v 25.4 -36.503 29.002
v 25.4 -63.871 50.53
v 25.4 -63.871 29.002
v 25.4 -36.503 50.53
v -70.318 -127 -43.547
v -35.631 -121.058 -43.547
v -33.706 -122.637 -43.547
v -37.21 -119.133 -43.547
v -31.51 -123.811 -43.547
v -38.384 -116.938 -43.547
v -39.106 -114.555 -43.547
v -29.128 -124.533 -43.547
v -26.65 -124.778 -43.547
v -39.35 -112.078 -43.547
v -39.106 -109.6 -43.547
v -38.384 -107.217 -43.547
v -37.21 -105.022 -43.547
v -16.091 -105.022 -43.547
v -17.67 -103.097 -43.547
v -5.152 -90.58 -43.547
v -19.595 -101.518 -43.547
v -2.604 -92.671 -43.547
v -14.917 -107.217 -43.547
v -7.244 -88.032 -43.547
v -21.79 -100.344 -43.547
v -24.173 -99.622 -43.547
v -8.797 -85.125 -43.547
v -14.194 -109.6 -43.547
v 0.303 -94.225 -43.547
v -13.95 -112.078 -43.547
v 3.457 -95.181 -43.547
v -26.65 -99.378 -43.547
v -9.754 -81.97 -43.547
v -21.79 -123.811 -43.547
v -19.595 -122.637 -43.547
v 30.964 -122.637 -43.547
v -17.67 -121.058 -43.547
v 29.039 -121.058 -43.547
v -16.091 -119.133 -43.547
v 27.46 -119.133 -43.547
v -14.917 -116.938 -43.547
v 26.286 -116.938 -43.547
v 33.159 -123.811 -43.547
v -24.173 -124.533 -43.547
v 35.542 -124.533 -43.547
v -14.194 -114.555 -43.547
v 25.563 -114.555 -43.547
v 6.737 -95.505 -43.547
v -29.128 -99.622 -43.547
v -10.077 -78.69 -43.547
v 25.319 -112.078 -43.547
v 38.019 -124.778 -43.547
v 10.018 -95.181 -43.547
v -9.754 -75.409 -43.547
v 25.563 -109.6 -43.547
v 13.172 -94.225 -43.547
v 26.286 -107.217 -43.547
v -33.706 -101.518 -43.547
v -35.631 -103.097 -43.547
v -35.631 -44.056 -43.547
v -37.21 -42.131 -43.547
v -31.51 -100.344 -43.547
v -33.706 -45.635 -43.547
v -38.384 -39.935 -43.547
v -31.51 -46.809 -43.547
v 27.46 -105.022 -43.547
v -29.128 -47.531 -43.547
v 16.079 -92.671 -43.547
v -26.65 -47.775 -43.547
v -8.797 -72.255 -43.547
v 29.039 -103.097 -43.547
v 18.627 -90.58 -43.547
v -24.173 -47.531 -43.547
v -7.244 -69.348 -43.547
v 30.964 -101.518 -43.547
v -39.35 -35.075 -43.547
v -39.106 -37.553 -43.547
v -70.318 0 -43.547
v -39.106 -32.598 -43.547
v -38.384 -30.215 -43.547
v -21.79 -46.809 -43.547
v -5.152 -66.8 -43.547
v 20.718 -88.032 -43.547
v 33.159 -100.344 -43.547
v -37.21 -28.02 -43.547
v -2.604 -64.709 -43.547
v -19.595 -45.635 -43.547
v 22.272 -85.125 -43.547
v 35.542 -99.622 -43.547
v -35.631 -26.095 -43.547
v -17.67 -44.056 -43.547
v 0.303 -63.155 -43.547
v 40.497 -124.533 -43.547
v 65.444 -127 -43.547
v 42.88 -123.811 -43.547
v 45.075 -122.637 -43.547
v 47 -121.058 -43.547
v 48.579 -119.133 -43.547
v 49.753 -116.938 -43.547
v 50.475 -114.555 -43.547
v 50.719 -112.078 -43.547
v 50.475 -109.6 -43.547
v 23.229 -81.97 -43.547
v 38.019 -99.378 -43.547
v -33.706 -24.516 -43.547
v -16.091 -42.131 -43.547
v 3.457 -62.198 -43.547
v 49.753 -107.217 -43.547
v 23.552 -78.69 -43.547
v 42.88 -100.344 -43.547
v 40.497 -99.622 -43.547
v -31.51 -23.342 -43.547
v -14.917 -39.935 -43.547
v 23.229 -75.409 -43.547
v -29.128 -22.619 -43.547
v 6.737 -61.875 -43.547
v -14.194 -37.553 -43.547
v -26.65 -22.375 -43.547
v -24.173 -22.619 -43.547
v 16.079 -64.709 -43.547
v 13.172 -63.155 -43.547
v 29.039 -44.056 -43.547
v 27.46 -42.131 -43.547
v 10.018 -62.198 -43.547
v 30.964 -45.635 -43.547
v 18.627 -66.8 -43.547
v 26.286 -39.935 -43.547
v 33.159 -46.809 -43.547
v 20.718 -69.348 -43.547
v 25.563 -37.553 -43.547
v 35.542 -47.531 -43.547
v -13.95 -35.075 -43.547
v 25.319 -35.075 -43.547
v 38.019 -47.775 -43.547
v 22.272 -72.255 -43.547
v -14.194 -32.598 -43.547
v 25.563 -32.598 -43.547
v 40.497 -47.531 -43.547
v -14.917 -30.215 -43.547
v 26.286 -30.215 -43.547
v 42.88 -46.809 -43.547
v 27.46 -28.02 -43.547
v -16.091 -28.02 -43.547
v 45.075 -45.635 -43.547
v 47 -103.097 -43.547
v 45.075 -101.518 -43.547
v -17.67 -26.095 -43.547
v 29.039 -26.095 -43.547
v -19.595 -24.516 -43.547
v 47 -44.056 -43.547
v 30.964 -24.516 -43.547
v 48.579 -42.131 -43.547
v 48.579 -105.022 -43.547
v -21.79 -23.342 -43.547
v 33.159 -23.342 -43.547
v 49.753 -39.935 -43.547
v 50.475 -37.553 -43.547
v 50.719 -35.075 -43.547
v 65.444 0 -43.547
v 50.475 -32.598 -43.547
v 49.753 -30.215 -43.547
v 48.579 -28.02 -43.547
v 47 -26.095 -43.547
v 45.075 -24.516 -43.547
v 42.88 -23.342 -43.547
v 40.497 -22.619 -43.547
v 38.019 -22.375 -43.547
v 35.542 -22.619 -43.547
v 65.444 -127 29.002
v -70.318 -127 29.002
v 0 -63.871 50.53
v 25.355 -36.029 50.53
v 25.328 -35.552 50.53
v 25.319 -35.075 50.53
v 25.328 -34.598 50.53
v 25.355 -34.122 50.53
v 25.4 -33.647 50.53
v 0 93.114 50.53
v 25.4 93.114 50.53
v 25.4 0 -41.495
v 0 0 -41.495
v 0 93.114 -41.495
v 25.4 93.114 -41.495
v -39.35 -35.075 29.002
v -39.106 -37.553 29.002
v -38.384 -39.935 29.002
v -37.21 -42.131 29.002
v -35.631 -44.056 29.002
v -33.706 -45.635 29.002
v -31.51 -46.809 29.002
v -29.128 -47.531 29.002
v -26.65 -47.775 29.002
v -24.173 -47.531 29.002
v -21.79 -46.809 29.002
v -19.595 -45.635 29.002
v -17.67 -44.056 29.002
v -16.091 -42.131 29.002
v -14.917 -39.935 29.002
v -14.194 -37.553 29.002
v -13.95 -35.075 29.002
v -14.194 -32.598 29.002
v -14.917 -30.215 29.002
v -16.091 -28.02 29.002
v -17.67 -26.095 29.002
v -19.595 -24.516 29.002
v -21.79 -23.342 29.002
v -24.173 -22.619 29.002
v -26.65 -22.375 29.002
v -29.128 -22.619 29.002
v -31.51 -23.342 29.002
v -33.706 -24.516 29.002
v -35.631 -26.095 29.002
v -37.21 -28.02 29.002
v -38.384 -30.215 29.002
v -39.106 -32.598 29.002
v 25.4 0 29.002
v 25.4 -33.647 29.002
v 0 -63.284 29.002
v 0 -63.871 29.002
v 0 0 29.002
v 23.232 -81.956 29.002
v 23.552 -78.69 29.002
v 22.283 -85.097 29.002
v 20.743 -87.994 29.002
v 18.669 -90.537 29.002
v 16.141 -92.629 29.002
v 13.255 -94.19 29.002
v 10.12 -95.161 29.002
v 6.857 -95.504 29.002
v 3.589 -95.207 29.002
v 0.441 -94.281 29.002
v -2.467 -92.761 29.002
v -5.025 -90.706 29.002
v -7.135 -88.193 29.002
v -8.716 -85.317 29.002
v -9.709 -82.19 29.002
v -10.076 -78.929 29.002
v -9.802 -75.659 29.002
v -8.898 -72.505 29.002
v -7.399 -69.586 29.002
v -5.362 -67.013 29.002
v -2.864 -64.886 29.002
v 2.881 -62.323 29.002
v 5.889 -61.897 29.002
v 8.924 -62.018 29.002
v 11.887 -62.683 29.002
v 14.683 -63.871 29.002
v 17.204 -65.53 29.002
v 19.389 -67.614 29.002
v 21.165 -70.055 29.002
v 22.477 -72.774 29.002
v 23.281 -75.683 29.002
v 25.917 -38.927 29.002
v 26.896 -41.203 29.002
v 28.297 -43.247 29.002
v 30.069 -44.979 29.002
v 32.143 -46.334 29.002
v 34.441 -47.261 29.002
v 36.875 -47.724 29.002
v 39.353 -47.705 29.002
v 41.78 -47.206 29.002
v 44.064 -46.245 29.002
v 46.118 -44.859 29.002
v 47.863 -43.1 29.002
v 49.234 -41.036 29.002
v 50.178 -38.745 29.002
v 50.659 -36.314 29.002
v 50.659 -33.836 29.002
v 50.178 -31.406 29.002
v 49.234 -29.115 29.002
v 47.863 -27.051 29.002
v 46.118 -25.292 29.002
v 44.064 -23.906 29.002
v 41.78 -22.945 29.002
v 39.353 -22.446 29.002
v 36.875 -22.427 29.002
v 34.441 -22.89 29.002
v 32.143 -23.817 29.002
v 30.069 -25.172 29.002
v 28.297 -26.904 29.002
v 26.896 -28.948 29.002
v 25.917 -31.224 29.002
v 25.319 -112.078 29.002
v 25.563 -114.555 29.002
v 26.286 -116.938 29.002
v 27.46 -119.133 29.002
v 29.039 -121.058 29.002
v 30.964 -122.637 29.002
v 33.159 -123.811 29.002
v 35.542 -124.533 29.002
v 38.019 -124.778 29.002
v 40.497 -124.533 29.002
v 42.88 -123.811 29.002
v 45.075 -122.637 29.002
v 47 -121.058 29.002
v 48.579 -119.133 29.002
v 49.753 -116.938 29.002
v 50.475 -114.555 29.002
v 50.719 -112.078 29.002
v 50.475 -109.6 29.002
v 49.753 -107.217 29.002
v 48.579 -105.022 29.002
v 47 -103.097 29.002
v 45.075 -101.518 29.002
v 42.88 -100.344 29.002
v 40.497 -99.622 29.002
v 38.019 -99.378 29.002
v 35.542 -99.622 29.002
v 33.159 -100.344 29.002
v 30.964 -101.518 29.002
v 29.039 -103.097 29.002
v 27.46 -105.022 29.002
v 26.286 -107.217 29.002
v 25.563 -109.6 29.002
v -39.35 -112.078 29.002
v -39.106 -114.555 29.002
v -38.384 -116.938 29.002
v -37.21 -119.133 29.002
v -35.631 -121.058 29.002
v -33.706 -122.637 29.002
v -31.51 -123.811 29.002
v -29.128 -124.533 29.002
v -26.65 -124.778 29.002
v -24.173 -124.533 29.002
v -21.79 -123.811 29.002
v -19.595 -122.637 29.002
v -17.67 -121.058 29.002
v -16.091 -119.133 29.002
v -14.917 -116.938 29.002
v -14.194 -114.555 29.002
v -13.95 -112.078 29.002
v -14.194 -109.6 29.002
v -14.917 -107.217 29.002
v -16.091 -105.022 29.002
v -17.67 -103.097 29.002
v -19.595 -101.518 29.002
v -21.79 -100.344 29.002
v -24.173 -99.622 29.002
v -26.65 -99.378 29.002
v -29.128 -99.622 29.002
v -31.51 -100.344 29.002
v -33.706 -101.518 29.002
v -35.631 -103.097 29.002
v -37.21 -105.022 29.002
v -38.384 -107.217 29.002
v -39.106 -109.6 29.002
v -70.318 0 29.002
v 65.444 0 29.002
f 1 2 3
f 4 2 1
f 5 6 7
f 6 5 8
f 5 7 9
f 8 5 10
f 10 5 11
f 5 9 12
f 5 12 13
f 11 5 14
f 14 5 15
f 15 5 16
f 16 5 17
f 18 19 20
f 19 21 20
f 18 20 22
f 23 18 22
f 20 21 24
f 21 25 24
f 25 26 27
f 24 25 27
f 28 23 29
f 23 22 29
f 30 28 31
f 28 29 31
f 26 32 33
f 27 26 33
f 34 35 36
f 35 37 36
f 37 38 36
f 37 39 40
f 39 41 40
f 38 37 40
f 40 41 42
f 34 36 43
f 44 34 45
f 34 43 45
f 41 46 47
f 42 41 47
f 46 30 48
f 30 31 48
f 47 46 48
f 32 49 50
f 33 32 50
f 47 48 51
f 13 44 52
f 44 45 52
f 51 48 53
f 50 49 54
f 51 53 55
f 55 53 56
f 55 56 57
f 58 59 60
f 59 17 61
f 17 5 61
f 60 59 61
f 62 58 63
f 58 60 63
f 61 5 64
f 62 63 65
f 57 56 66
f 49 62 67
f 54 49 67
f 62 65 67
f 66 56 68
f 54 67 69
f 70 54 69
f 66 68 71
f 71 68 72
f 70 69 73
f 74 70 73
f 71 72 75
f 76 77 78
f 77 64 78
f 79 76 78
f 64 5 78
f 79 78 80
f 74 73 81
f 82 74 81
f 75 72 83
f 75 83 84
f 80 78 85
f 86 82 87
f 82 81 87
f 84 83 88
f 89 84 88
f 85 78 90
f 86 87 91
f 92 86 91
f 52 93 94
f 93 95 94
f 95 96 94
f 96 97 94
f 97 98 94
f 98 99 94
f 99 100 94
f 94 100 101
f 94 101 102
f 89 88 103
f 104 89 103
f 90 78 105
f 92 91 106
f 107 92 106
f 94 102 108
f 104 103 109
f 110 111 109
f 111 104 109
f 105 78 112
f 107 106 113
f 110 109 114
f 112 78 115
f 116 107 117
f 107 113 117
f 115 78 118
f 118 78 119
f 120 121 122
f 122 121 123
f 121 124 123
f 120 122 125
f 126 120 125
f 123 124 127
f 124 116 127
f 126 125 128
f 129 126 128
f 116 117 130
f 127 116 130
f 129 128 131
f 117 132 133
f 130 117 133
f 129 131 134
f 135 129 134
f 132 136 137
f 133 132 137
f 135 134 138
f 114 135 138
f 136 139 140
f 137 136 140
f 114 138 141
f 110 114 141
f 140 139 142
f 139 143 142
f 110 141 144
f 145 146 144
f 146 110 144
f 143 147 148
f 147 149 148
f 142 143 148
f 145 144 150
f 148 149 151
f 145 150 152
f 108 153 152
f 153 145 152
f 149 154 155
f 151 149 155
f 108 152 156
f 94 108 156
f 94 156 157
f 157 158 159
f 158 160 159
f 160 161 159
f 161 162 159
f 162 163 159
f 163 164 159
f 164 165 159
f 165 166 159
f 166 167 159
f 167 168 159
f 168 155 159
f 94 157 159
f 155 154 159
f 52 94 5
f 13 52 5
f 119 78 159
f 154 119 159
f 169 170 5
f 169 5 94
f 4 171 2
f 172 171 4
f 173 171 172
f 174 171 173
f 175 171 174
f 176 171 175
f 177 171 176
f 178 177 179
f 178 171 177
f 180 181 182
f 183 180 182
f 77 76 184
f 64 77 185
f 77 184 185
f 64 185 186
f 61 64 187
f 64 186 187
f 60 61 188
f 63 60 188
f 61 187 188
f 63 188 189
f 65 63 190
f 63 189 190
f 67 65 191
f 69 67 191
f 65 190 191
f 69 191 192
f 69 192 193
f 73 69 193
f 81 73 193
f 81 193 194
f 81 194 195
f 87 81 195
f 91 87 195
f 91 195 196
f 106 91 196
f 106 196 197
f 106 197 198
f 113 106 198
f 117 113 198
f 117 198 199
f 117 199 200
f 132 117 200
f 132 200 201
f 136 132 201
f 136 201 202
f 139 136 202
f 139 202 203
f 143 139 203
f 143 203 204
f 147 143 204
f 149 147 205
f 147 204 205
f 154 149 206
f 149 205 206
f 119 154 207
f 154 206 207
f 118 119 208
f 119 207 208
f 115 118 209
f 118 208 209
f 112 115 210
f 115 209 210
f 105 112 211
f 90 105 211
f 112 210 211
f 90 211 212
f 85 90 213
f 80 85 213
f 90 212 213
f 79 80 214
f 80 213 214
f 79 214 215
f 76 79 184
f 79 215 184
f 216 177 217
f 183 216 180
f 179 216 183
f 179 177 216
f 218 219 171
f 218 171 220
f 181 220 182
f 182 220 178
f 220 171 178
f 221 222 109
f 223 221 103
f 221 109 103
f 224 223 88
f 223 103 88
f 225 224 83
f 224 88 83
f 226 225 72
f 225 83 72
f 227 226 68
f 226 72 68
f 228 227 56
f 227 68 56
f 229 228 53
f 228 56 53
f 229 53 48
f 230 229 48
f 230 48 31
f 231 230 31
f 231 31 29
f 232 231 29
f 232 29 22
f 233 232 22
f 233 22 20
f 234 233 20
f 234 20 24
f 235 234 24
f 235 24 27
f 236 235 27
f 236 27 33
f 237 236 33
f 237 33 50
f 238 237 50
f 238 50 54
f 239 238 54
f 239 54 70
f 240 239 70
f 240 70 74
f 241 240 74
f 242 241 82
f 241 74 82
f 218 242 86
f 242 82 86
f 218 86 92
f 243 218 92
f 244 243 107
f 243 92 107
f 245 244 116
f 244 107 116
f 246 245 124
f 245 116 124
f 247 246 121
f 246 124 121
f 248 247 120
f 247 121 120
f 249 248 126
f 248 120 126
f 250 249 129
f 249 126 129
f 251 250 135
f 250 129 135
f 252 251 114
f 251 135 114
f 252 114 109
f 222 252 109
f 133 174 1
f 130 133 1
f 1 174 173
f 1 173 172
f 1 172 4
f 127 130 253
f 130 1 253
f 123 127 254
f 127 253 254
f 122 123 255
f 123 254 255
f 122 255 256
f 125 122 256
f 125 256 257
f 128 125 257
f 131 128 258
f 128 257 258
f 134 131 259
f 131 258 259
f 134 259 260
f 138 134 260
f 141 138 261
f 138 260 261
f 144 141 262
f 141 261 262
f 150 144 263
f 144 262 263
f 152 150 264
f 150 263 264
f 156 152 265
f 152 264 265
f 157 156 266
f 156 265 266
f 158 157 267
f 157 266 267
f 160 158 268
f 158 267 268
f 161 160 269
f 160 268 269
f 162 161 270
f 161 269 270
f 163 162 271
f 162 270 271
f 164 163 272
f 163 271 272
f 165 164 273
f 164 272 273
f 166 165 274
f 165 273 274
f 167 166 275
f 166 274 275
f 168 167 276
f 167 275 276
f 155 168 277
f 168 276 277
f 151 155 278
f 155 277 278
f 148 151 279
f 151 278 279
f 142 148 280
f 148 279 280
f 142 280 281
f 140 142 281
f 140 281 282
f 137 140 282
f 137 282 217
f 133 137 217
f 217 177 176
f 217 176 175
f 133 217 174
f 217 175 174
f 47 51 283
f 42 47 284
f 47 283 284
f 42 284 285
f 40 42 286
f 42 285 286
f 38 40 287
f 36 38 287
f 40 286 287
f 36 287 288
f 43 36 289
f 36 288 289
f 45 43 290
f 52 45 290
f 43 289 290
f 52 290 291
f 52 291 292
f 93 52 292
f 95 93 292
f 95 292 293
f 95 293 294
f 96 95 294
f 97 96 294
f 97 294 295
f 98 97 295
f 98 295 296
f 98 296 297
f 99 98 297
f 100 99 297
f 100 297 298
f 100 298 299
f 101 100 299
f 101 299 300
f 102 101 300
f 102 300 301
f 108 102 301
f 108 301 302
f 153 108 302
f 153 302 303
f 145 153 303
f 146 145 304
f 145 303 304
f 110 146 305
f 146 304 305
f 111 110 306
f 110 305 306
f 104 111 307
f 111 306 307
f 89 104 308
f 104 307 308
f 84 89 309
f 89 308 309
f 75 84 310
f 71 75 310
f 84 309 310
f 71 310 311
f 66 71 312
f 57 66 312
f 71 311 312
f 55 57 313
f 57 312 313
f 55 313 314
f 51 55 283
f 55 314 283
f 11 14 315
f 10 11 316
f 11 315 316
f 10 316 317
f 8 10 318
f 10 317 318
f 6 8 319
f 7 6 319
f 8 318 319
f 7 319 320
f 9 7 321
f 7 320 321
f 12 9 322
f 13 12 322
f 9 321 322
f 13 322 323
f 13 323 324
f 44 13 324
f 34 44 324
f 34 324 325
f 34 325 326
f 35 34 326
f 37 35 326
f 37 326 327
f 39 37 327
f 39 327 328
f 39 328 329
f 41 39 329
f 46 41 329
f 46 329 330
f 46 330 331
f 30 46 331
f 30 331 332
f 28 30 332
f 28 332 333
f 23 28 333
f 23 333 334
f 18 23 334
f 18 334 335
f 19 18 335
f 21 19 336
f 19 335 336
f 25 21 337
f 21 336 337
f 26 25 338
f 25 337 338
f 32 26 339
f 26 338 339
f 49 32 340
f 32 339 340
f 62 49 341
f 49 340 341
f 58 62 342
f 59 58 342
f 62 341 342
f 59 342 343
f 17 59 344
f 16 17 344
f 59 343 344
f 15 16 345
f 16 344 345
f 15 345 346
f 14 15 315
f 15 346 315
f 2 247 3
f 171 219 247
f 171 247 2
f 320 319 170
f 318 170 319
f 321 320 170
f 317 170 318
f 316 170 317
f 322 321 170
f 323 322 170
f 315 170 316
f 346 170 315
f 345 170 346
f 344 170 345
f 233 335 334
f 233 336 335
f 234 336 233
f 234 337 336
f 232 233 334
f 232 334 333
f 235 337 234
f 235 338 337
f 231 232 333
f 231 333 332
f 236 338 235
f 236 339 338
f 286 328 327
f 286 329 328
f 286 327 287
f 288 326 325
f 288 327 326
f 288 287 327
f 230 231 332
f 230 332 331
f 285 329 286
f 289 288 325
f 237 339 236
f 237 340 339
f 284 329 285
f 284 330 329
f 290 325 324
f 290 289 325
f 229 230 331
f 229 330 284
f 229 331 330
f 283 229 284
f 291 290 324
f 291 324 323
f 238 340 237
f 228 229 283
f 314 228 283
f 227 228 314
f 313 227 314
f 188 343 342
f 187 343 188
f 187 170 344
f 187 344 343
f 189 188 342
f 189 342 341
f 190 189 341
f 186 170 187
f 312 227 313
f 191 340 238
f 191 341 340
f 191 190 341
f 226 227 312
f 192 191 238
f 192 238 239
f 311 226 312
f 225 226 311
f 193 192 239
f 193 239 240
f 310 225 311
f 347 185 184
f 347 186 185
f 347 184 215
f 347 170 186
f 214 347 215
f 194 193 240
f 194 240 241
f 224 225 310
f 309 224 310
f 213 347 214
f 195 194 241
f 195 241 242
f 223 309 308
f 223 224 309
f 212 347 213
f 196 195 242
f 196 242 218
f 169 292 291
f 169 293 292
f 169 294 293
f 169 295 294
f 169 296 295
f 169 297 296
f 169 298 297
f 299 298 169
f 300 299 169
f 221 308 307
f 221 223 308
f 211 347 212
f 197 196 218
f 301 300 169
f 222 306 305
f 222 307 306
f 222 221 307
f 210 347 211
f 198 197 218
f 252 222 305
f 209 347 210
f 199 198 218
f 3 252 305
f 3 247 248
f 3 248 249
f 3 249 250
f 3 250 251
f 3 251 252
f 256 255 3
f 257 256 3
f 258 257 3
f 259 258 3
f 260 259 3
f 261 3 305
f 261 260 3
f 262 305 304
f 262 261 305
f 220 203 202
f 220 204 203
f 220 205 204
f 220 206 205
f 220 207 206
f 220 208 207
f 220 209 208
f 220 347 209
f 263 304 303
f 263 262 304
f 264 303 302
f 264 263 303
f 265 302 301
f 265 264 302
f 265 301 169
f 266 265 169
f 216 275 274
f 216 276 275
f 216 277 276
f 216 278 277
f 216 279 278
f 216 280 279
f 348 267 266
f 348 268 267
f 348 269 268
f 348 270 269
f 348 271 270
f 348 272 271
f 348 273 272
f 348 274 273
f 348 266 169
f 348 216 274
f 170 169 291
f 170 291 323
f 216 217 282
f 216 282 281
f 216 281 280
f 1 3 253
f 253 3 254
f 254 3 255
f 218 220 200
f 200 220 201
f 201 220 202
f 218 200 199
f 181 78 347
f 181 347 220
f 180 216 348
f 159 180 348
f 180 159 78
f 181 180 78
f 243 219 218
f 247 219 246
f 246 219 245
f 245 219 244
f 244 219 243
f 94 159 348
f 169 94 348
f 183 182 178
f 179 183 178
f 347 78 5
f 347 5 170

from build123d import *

# Parameters (mm, degrees)
F0_W     = 156.9848433137
F0_H     = 92.025604099
F1_DEPTH = 25.4
F2_W     = 135.7623711228
F2_H     = 72.5497286767
F4_DEPTH = 127
F6_D     = 25.4
F8_R     = 16.8146432666
F9_DEPTH = 72.5497286767


# Not quite as in the source:
# - a feature of the source that left no trace in its solid (it failed there, or was rolled back) is left out


with BuildPart() as f1:
    # F0 (on Right) → F1 (new body)
    with BuildSketch(Plane.YZ):
        with Locations((14.6216116846, 4.5173931867)):
            Rectangle(F0_W, F0_H)
    extrude(amount=F1_DEPTH)

    # F2 (on Front) → F4 (join)
    with BuildSketch(Plane.XZ):
        with Locations((-2.4367310107, -7.2724418715)):
            Rectangle(F2_W, F2_H)
    extrude(amount=F4_DEPTH)

    # F6 (through all)
    with Locations(Plane(origin=(0, 0, -43.5473062098), x_dir=(1, 0, 0), z_dir=(0, 0, -1))):
        with Locations((38.019452244, 112.0775043964), (38.019452244, 35.0753962994), (-26.6502853483, 35.0753962994), (-26.6502853483, 112.0775043964)):
            Hole(F6_D / 2)

    # F8 (on face) → F9 (cut, through all)
    with BuildSketch(Plane(origin=(0, 0, -43.5473062098), x_dir=(1, 0, 0), z_dir=(0, 0, -1))):
        with Locations((6.7373481579, 78.689865768)):
            Circle(F8_R)
    extrude(amount=-F9_DEPTH, mode=Mode.SUBTRACT)


solid = f1.part
